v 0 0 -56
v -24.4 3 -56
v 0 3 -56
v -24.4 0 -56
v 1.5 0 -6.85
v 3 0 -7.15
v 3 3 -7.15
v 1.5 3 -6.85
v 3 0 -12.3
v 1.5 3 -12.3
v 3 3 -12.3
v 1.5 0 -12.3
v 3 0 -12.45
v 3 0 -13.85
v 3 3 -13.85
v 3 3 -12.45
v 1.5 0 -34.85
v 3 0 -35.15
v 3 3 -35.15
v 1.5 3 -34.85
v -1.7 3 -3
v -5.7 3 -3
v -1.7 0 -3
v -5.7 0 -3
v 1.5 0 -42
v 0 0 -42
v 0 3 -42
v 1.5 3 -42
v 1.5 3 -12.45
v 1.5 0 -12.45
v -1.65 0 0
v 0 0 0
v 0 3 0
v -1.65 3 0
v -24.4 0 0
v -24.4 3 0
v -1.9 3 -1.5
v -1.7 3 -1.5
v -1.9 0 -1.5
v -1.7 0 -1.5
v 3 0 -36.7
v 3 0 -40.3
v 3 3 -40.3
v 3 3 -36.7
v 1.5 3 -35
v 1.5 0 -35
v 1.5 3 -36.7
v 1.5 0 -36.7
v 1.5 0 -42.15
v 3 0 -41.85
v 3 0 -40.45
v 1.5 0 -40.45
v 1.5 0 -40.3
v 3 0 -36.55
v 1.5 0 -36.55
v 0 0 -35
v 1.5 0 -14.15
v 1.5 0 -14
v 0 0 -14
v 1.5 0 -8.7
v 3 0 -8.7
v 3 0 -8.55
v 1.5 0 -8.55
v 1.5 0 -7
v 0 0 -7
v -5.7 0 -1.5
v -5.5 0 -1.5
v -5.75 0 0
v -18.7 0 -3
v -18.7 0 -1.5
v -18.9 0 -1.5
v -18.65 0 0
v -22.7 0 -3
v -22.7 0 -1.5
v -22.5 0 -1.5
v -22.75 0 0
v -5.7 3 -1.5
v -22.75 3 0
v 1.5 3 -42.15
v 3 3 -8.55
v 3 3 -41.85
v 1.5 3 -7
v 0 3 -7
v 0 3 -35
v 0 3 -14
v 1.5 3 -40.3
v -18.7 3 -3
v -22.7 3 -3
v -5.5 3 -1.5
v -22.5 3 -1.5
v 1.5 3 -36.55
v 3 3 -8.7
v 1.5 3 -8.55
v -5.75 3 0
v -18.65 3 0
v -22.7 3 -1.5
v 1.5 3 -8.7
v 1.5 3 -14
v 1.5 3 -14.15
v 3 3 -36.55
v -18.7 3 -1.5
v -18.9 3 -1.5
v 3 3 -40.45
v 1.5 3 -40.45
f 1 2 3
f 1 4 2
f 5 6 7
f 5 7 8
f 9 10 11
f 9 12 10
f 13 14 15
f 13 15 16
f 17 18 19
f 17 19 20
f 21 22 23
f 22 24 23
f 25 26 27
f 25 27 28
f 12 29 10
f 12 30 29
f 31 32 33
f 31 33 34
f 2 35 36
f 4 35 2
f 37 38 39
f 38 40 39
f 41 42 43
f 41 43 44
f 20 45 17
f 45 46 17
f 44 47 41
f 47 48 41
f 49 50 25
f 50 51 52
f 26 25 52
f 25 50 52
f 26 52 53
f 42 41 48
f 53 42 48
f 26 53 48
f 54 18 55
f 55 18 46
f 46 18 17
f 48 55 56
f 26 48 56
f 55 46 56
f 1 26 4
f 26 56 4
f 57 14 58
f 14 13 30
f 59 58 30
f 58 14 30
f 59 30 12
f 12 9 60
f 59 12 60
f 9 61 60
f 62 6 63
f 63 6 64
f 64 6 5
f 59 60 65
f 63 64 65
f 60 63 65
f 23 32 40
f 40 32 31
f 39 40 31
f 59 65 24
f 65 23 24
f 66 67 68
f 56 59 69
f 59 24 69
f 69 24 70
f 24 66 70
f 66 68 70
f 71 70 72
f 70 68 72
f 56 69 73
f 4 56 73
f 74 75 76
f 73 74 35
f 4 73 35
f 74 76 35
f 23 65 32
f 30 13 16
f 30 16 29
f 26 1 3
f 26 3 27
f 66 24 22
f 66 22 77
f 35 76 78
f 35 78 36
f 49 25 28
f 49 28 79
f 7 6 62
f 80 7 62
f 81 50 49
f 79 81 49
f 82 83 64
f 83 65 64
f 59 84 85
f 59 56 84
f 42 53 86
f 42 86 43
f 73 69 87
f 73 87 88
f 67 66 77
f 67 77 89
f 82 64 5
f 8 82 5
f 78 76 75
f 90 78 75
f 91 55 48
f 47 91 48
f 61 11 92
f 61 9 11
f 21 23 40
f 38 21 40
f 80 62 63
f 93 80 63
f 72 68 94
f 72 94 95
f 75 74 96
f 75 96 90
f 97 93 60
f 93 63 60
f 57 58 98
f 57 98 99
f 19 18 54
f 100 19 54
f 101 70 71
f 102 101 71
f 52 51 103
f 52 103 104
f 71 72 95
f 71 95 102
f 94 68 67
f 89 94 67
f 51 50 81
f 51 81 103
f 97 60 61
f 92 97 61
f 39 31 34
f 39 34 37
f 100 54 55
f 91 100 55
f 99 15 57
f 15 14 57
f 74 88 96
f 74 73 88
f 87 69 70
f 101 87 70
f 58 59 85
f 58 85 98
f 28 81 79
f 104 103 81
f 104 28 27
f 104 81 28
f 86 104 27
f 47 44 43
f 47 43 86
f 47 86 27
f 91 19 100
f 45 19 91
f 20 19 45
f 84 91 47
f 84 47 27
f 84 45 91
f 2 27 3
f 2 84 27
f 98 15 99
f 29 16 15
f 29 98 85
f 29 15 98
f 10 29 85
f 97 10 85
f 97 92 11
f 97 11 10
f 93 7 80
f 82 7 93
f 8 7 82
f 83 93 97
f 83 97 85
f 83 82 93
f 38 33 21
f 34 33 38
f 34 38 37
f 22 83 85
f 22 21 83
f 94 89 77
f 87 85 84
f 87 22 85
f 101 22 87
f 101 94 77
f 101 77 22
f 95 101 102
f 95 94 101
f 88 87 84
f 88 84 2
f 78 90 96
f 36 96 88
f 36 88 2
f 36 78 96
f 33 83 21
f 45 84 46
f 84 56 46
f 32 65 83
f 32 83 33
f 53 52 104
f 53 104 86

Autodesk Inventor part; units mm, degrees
ref_plane "YZ Plane" through (0, 0, 0) normal (1, 0, 0) x (0, 1, 0)
ref_plane "XZ Plane" through (0, 0, 0) normal (0, 1, 0) x (-1, 0, 0)
ref_plane "XY Plane" through (0, 0, 0) normal (0, 0, 1) x (1, 0, 0)
sketch "草圖1" plane through (0, 0, 0) normal (0, 1, 0) x (-1, 0, 0)
  line L0 (0, 0) -> (24.4, 0)
  line L1 (24.4, 0) -> (24.4, -56)
  line L2 (24.4, -56) -> (0, -56)
  line L3 (0, -56) -> (0, 0)
  line L4 (5.7, 0) -> (1.7, 0)
  line L5 (22.6499, 0) -> (18.7501, 0)
  line L6 (18.7, -2.9996) -> (22.7, -2.9996)
  line L7 (22.7, -2.9996) -> (22.7, -1.4996)
  line L8 (22.7, -1.4996) -> (22.5, -1.4996)
  line L9 (22.6499, 0) -> (22.7499, 0)
  line L10 (22.7499, 0) -> (22.5, -1.4996)
  line L11 (20.7, 0) -> (20.7, -2.9996)
  line L12 (18.7, -2.9996) -> (18.7, -1.4996)
  line L13 (18.7, -1.4996) -> (18.9, -1.4996)
  line L14 (18.6501, 0) -> (18.9, -1.4996)
  line L15 (12.2, 0) -> (12.2, -56)
  line L16 (5.7, -2.9996) -> (1.7, -2.9996)
  line L17 (1.7, -2.9996) -> (1.7, -1.4996)
  line L18 (1.7, -1.4996) -> (1.9, -1.4996)
  line L19 (1.6501, 0) -> (1.9, -1.4996)
  line L20 (5.7, -2.9996) -> (5.7, -1.4996)
  line L21 (5.7, -1.4996) -> (5.5, -1.4996)
  line L22 (5.7499, 0) -> (5.5, -1.4996)
  line L23 (0, -7) -> (-1.5, -7)
  line L24 (-1.5, -7) -> (-1.5, -6.85)
  line L25 (-3, -7.15) -> (-1.5, -6.85)
  line L26 (-3, -7.15) -> (-3, -8.55)
  line L27 (-3, -8.55) -> (-1.5, -8.55)
  line L28 (-1.5, -8.55) -> (-1.5, -8.7)
  line L29 (-1.5, -8.7) -> (-3, -8.7)
  line L30 (-3, -8.7) -> (-3, -10.5)
  line L31 (-3, -10.5) -> (0, -10.5)
  line L32 (0, -14) -> (-1.5, -14)
  line L33 (-1.5, -14) -> (-1.5, -14.15)
  line L34 (-3, -13.85) -> (-1.5, -14.15)
  line L35 (-3, -13.85) -> (-3, -12.45)
  line L36 (-3, -12.45) -> (-1.5, -12.45)
  line L37 (-1.5, -12.45) -> (-1.5, -12.3)
  line L38 (-1.5, -12.3) -> (-3, -12.3)
  line L39 (-3, -12.3) -> (-3, -10.5)
  line L40 (24.4, -28) -> (0, -28)
  line L41 (0, -42) -> (-1.5, -42)
  line L42 (-3, -41.85) -> (-1.5, -42.15)
  line L43 (-1.5, -42) -> (-1.5, -42.15)
  line L44 (-1.5, -35) -> (-1.5, -34.85)
  line L45 (-3, -35.15) -> (-1.5, -34.85)
  line L46 (-1.5, -36.55) -> (-1.5, -36.7)
  line L47 (-3, -35.15) -> (-3, -36.55)
  line L48 (-3, -36.55) -> (-1.5, -36.55)
  line L49 (-1.5, -36.7) -> (-3, -36.7)
  line L50 (-3, -38.5) -> (0, -38.5)
  line L51 (-3, -36.7) -> (-3, -38.5)
  line L52 (-1.5, -40.45) -> (-1.5, -40.3)
  line L53 (-1.5, -40.3) -> (-3, -40.3)
  line L54 (-3, -40.3) -> (-3, -38.5)
  line L55 (-3, -40.45) -> (-1.5, -40.45)
  line L56 (-3, -41.85) -> (-3, -40.45)
  line L57 (0, -35) -> (-1.5, -35)
  line L58 (24.4, -7) -> (25.9, -7)
  line L59 (25.9, -7) -> (25.9, -6.85)
  line L60 (27.4, -7.15) -> (25.9, -6.85)
  line L61 (27.4, -7.15) -> (27.4, -8.55)
  line L62 (27.4, -8.55) -> (25.9, -8.55)
  line L63 (25.9, -8.55) -> (25.9, -8.7)
  line L64 (25.9, -8.7) -> (27.4, -8.7)
  line L65 (27.4, -8.7) -> (27.4, -10.5)
  line L66 (27.4, -10.5) -> (24.4, -10.5)
  line L67 (24.4, -14) -> (25.9, -14)
  line L68 (25.9, -14) -> (25.9, -14.15)
  line L69 (25.9, -12.45) -> (25.9, -12.3)
  line L70 (27.4, -13.85) -> (27.4, -12.45)
  line L71 (27.4, -12.45) -> (25.9, -12.45)
  line L72 (25.9, -12.3) -> (27.4, -12.3)
  line L73 (27.4, -12.3) -> (27.4, -10.5)
  line L74 (27.4, -13.85) -> (25.9, -14.15)
  line L75 (25.9, -49) -> (25.9, -49.15)
  line L76 (24.4, -49) -> (25.9, -49)
  line L77 (27.4, -48.85) -> (25.9, -49.15)
  line L78 (25.9, -47.45) -> (25.9, -47.3)
  line L79 (27.4, -48.85) -> (27.4, -47.45)
  line L80 (27.4, -47.45) -> (25.9, -47.45)
  line L81 (25.9, -47.3) -> (27.4, -47.3)
  line L82 (27.4, -47.3) -> (27.4, -45.5)
  line L83 (27.4, -45.5) -> (24.4, -45.5)
  line L84 (27.4, -43.7) -> (27.4, -45.5)
  line L85 (25.9, -43.7) -> (27.4, -43.7)
  line L86 (25.9, -43.55) -> (25.9, -43.7)
  line L87 (27.4, -43.55) -> (25.9, -43.55)
  line L88 (24.4, -42) -> (25.9, -42)
  line L89 (25.9, -42) -> (25.9, -41.85)
  line L90 (27.4, -42.15) -> (25.9, -41.85)
  line L91 (27.4, -42.15) -> (27.4, -43.55)
  point P0 (0, -14)
  point P1 (18.6501, 0)
  point P2 (5.7499, 0)
  point P3 (1.6501, 0)
  dimension "d0" = 56
  dimension "d1" = 24.4
  dimension "d5" = 3
  dimension "d6" = 4
  dimension "d7" = 3.7
  dimension "d8" = 1.5
  dimension "d9" = 0.2
  dimension "d10" = 0.1
  dimension "d11" = 9.462
  dimension "d12" = 1.7
  dimension "d14" = 0.15
  dimension "d17" = 1.4
  dimension "d18" = 0.15
  dimension "d19" = 1.8
  dimension "d20" = 7
  dimension "d21" = 78.69
  dimension "d22" = 25.9
  dimension "d23" = 25.9
  dimension "d24" = 27.4
  dimension "d25" = 27.4
  dimension "d26" = 18.7
  dimension "d27" = 22.7
  dimension "d31" = 0.15
  dimension "d34" = 28
extrude "擠出1" add sketch "草圖1" along normal blind 3 contours L0 L19 L18 L17 L16 L20 L21 L22 L15 L40 L3 | L3 L31 L30 L29 L28 L27 L26 L25 L24 L23 | L3 L32 L33 L34 L35 L36 L37 L38 L39 L31 | L40 L15 L2 L3 | L0 L14 L13 L12 L6 L7 L8 L10 L1 L40 L15 | L3 L50 L51 L49 L46 L48 L47 L45 L44 L57 | L40 L1 L2 L15 | L3 L41 L43 L42 L56 L55 L52 L53 L54 L50
properties part number "左右2"
